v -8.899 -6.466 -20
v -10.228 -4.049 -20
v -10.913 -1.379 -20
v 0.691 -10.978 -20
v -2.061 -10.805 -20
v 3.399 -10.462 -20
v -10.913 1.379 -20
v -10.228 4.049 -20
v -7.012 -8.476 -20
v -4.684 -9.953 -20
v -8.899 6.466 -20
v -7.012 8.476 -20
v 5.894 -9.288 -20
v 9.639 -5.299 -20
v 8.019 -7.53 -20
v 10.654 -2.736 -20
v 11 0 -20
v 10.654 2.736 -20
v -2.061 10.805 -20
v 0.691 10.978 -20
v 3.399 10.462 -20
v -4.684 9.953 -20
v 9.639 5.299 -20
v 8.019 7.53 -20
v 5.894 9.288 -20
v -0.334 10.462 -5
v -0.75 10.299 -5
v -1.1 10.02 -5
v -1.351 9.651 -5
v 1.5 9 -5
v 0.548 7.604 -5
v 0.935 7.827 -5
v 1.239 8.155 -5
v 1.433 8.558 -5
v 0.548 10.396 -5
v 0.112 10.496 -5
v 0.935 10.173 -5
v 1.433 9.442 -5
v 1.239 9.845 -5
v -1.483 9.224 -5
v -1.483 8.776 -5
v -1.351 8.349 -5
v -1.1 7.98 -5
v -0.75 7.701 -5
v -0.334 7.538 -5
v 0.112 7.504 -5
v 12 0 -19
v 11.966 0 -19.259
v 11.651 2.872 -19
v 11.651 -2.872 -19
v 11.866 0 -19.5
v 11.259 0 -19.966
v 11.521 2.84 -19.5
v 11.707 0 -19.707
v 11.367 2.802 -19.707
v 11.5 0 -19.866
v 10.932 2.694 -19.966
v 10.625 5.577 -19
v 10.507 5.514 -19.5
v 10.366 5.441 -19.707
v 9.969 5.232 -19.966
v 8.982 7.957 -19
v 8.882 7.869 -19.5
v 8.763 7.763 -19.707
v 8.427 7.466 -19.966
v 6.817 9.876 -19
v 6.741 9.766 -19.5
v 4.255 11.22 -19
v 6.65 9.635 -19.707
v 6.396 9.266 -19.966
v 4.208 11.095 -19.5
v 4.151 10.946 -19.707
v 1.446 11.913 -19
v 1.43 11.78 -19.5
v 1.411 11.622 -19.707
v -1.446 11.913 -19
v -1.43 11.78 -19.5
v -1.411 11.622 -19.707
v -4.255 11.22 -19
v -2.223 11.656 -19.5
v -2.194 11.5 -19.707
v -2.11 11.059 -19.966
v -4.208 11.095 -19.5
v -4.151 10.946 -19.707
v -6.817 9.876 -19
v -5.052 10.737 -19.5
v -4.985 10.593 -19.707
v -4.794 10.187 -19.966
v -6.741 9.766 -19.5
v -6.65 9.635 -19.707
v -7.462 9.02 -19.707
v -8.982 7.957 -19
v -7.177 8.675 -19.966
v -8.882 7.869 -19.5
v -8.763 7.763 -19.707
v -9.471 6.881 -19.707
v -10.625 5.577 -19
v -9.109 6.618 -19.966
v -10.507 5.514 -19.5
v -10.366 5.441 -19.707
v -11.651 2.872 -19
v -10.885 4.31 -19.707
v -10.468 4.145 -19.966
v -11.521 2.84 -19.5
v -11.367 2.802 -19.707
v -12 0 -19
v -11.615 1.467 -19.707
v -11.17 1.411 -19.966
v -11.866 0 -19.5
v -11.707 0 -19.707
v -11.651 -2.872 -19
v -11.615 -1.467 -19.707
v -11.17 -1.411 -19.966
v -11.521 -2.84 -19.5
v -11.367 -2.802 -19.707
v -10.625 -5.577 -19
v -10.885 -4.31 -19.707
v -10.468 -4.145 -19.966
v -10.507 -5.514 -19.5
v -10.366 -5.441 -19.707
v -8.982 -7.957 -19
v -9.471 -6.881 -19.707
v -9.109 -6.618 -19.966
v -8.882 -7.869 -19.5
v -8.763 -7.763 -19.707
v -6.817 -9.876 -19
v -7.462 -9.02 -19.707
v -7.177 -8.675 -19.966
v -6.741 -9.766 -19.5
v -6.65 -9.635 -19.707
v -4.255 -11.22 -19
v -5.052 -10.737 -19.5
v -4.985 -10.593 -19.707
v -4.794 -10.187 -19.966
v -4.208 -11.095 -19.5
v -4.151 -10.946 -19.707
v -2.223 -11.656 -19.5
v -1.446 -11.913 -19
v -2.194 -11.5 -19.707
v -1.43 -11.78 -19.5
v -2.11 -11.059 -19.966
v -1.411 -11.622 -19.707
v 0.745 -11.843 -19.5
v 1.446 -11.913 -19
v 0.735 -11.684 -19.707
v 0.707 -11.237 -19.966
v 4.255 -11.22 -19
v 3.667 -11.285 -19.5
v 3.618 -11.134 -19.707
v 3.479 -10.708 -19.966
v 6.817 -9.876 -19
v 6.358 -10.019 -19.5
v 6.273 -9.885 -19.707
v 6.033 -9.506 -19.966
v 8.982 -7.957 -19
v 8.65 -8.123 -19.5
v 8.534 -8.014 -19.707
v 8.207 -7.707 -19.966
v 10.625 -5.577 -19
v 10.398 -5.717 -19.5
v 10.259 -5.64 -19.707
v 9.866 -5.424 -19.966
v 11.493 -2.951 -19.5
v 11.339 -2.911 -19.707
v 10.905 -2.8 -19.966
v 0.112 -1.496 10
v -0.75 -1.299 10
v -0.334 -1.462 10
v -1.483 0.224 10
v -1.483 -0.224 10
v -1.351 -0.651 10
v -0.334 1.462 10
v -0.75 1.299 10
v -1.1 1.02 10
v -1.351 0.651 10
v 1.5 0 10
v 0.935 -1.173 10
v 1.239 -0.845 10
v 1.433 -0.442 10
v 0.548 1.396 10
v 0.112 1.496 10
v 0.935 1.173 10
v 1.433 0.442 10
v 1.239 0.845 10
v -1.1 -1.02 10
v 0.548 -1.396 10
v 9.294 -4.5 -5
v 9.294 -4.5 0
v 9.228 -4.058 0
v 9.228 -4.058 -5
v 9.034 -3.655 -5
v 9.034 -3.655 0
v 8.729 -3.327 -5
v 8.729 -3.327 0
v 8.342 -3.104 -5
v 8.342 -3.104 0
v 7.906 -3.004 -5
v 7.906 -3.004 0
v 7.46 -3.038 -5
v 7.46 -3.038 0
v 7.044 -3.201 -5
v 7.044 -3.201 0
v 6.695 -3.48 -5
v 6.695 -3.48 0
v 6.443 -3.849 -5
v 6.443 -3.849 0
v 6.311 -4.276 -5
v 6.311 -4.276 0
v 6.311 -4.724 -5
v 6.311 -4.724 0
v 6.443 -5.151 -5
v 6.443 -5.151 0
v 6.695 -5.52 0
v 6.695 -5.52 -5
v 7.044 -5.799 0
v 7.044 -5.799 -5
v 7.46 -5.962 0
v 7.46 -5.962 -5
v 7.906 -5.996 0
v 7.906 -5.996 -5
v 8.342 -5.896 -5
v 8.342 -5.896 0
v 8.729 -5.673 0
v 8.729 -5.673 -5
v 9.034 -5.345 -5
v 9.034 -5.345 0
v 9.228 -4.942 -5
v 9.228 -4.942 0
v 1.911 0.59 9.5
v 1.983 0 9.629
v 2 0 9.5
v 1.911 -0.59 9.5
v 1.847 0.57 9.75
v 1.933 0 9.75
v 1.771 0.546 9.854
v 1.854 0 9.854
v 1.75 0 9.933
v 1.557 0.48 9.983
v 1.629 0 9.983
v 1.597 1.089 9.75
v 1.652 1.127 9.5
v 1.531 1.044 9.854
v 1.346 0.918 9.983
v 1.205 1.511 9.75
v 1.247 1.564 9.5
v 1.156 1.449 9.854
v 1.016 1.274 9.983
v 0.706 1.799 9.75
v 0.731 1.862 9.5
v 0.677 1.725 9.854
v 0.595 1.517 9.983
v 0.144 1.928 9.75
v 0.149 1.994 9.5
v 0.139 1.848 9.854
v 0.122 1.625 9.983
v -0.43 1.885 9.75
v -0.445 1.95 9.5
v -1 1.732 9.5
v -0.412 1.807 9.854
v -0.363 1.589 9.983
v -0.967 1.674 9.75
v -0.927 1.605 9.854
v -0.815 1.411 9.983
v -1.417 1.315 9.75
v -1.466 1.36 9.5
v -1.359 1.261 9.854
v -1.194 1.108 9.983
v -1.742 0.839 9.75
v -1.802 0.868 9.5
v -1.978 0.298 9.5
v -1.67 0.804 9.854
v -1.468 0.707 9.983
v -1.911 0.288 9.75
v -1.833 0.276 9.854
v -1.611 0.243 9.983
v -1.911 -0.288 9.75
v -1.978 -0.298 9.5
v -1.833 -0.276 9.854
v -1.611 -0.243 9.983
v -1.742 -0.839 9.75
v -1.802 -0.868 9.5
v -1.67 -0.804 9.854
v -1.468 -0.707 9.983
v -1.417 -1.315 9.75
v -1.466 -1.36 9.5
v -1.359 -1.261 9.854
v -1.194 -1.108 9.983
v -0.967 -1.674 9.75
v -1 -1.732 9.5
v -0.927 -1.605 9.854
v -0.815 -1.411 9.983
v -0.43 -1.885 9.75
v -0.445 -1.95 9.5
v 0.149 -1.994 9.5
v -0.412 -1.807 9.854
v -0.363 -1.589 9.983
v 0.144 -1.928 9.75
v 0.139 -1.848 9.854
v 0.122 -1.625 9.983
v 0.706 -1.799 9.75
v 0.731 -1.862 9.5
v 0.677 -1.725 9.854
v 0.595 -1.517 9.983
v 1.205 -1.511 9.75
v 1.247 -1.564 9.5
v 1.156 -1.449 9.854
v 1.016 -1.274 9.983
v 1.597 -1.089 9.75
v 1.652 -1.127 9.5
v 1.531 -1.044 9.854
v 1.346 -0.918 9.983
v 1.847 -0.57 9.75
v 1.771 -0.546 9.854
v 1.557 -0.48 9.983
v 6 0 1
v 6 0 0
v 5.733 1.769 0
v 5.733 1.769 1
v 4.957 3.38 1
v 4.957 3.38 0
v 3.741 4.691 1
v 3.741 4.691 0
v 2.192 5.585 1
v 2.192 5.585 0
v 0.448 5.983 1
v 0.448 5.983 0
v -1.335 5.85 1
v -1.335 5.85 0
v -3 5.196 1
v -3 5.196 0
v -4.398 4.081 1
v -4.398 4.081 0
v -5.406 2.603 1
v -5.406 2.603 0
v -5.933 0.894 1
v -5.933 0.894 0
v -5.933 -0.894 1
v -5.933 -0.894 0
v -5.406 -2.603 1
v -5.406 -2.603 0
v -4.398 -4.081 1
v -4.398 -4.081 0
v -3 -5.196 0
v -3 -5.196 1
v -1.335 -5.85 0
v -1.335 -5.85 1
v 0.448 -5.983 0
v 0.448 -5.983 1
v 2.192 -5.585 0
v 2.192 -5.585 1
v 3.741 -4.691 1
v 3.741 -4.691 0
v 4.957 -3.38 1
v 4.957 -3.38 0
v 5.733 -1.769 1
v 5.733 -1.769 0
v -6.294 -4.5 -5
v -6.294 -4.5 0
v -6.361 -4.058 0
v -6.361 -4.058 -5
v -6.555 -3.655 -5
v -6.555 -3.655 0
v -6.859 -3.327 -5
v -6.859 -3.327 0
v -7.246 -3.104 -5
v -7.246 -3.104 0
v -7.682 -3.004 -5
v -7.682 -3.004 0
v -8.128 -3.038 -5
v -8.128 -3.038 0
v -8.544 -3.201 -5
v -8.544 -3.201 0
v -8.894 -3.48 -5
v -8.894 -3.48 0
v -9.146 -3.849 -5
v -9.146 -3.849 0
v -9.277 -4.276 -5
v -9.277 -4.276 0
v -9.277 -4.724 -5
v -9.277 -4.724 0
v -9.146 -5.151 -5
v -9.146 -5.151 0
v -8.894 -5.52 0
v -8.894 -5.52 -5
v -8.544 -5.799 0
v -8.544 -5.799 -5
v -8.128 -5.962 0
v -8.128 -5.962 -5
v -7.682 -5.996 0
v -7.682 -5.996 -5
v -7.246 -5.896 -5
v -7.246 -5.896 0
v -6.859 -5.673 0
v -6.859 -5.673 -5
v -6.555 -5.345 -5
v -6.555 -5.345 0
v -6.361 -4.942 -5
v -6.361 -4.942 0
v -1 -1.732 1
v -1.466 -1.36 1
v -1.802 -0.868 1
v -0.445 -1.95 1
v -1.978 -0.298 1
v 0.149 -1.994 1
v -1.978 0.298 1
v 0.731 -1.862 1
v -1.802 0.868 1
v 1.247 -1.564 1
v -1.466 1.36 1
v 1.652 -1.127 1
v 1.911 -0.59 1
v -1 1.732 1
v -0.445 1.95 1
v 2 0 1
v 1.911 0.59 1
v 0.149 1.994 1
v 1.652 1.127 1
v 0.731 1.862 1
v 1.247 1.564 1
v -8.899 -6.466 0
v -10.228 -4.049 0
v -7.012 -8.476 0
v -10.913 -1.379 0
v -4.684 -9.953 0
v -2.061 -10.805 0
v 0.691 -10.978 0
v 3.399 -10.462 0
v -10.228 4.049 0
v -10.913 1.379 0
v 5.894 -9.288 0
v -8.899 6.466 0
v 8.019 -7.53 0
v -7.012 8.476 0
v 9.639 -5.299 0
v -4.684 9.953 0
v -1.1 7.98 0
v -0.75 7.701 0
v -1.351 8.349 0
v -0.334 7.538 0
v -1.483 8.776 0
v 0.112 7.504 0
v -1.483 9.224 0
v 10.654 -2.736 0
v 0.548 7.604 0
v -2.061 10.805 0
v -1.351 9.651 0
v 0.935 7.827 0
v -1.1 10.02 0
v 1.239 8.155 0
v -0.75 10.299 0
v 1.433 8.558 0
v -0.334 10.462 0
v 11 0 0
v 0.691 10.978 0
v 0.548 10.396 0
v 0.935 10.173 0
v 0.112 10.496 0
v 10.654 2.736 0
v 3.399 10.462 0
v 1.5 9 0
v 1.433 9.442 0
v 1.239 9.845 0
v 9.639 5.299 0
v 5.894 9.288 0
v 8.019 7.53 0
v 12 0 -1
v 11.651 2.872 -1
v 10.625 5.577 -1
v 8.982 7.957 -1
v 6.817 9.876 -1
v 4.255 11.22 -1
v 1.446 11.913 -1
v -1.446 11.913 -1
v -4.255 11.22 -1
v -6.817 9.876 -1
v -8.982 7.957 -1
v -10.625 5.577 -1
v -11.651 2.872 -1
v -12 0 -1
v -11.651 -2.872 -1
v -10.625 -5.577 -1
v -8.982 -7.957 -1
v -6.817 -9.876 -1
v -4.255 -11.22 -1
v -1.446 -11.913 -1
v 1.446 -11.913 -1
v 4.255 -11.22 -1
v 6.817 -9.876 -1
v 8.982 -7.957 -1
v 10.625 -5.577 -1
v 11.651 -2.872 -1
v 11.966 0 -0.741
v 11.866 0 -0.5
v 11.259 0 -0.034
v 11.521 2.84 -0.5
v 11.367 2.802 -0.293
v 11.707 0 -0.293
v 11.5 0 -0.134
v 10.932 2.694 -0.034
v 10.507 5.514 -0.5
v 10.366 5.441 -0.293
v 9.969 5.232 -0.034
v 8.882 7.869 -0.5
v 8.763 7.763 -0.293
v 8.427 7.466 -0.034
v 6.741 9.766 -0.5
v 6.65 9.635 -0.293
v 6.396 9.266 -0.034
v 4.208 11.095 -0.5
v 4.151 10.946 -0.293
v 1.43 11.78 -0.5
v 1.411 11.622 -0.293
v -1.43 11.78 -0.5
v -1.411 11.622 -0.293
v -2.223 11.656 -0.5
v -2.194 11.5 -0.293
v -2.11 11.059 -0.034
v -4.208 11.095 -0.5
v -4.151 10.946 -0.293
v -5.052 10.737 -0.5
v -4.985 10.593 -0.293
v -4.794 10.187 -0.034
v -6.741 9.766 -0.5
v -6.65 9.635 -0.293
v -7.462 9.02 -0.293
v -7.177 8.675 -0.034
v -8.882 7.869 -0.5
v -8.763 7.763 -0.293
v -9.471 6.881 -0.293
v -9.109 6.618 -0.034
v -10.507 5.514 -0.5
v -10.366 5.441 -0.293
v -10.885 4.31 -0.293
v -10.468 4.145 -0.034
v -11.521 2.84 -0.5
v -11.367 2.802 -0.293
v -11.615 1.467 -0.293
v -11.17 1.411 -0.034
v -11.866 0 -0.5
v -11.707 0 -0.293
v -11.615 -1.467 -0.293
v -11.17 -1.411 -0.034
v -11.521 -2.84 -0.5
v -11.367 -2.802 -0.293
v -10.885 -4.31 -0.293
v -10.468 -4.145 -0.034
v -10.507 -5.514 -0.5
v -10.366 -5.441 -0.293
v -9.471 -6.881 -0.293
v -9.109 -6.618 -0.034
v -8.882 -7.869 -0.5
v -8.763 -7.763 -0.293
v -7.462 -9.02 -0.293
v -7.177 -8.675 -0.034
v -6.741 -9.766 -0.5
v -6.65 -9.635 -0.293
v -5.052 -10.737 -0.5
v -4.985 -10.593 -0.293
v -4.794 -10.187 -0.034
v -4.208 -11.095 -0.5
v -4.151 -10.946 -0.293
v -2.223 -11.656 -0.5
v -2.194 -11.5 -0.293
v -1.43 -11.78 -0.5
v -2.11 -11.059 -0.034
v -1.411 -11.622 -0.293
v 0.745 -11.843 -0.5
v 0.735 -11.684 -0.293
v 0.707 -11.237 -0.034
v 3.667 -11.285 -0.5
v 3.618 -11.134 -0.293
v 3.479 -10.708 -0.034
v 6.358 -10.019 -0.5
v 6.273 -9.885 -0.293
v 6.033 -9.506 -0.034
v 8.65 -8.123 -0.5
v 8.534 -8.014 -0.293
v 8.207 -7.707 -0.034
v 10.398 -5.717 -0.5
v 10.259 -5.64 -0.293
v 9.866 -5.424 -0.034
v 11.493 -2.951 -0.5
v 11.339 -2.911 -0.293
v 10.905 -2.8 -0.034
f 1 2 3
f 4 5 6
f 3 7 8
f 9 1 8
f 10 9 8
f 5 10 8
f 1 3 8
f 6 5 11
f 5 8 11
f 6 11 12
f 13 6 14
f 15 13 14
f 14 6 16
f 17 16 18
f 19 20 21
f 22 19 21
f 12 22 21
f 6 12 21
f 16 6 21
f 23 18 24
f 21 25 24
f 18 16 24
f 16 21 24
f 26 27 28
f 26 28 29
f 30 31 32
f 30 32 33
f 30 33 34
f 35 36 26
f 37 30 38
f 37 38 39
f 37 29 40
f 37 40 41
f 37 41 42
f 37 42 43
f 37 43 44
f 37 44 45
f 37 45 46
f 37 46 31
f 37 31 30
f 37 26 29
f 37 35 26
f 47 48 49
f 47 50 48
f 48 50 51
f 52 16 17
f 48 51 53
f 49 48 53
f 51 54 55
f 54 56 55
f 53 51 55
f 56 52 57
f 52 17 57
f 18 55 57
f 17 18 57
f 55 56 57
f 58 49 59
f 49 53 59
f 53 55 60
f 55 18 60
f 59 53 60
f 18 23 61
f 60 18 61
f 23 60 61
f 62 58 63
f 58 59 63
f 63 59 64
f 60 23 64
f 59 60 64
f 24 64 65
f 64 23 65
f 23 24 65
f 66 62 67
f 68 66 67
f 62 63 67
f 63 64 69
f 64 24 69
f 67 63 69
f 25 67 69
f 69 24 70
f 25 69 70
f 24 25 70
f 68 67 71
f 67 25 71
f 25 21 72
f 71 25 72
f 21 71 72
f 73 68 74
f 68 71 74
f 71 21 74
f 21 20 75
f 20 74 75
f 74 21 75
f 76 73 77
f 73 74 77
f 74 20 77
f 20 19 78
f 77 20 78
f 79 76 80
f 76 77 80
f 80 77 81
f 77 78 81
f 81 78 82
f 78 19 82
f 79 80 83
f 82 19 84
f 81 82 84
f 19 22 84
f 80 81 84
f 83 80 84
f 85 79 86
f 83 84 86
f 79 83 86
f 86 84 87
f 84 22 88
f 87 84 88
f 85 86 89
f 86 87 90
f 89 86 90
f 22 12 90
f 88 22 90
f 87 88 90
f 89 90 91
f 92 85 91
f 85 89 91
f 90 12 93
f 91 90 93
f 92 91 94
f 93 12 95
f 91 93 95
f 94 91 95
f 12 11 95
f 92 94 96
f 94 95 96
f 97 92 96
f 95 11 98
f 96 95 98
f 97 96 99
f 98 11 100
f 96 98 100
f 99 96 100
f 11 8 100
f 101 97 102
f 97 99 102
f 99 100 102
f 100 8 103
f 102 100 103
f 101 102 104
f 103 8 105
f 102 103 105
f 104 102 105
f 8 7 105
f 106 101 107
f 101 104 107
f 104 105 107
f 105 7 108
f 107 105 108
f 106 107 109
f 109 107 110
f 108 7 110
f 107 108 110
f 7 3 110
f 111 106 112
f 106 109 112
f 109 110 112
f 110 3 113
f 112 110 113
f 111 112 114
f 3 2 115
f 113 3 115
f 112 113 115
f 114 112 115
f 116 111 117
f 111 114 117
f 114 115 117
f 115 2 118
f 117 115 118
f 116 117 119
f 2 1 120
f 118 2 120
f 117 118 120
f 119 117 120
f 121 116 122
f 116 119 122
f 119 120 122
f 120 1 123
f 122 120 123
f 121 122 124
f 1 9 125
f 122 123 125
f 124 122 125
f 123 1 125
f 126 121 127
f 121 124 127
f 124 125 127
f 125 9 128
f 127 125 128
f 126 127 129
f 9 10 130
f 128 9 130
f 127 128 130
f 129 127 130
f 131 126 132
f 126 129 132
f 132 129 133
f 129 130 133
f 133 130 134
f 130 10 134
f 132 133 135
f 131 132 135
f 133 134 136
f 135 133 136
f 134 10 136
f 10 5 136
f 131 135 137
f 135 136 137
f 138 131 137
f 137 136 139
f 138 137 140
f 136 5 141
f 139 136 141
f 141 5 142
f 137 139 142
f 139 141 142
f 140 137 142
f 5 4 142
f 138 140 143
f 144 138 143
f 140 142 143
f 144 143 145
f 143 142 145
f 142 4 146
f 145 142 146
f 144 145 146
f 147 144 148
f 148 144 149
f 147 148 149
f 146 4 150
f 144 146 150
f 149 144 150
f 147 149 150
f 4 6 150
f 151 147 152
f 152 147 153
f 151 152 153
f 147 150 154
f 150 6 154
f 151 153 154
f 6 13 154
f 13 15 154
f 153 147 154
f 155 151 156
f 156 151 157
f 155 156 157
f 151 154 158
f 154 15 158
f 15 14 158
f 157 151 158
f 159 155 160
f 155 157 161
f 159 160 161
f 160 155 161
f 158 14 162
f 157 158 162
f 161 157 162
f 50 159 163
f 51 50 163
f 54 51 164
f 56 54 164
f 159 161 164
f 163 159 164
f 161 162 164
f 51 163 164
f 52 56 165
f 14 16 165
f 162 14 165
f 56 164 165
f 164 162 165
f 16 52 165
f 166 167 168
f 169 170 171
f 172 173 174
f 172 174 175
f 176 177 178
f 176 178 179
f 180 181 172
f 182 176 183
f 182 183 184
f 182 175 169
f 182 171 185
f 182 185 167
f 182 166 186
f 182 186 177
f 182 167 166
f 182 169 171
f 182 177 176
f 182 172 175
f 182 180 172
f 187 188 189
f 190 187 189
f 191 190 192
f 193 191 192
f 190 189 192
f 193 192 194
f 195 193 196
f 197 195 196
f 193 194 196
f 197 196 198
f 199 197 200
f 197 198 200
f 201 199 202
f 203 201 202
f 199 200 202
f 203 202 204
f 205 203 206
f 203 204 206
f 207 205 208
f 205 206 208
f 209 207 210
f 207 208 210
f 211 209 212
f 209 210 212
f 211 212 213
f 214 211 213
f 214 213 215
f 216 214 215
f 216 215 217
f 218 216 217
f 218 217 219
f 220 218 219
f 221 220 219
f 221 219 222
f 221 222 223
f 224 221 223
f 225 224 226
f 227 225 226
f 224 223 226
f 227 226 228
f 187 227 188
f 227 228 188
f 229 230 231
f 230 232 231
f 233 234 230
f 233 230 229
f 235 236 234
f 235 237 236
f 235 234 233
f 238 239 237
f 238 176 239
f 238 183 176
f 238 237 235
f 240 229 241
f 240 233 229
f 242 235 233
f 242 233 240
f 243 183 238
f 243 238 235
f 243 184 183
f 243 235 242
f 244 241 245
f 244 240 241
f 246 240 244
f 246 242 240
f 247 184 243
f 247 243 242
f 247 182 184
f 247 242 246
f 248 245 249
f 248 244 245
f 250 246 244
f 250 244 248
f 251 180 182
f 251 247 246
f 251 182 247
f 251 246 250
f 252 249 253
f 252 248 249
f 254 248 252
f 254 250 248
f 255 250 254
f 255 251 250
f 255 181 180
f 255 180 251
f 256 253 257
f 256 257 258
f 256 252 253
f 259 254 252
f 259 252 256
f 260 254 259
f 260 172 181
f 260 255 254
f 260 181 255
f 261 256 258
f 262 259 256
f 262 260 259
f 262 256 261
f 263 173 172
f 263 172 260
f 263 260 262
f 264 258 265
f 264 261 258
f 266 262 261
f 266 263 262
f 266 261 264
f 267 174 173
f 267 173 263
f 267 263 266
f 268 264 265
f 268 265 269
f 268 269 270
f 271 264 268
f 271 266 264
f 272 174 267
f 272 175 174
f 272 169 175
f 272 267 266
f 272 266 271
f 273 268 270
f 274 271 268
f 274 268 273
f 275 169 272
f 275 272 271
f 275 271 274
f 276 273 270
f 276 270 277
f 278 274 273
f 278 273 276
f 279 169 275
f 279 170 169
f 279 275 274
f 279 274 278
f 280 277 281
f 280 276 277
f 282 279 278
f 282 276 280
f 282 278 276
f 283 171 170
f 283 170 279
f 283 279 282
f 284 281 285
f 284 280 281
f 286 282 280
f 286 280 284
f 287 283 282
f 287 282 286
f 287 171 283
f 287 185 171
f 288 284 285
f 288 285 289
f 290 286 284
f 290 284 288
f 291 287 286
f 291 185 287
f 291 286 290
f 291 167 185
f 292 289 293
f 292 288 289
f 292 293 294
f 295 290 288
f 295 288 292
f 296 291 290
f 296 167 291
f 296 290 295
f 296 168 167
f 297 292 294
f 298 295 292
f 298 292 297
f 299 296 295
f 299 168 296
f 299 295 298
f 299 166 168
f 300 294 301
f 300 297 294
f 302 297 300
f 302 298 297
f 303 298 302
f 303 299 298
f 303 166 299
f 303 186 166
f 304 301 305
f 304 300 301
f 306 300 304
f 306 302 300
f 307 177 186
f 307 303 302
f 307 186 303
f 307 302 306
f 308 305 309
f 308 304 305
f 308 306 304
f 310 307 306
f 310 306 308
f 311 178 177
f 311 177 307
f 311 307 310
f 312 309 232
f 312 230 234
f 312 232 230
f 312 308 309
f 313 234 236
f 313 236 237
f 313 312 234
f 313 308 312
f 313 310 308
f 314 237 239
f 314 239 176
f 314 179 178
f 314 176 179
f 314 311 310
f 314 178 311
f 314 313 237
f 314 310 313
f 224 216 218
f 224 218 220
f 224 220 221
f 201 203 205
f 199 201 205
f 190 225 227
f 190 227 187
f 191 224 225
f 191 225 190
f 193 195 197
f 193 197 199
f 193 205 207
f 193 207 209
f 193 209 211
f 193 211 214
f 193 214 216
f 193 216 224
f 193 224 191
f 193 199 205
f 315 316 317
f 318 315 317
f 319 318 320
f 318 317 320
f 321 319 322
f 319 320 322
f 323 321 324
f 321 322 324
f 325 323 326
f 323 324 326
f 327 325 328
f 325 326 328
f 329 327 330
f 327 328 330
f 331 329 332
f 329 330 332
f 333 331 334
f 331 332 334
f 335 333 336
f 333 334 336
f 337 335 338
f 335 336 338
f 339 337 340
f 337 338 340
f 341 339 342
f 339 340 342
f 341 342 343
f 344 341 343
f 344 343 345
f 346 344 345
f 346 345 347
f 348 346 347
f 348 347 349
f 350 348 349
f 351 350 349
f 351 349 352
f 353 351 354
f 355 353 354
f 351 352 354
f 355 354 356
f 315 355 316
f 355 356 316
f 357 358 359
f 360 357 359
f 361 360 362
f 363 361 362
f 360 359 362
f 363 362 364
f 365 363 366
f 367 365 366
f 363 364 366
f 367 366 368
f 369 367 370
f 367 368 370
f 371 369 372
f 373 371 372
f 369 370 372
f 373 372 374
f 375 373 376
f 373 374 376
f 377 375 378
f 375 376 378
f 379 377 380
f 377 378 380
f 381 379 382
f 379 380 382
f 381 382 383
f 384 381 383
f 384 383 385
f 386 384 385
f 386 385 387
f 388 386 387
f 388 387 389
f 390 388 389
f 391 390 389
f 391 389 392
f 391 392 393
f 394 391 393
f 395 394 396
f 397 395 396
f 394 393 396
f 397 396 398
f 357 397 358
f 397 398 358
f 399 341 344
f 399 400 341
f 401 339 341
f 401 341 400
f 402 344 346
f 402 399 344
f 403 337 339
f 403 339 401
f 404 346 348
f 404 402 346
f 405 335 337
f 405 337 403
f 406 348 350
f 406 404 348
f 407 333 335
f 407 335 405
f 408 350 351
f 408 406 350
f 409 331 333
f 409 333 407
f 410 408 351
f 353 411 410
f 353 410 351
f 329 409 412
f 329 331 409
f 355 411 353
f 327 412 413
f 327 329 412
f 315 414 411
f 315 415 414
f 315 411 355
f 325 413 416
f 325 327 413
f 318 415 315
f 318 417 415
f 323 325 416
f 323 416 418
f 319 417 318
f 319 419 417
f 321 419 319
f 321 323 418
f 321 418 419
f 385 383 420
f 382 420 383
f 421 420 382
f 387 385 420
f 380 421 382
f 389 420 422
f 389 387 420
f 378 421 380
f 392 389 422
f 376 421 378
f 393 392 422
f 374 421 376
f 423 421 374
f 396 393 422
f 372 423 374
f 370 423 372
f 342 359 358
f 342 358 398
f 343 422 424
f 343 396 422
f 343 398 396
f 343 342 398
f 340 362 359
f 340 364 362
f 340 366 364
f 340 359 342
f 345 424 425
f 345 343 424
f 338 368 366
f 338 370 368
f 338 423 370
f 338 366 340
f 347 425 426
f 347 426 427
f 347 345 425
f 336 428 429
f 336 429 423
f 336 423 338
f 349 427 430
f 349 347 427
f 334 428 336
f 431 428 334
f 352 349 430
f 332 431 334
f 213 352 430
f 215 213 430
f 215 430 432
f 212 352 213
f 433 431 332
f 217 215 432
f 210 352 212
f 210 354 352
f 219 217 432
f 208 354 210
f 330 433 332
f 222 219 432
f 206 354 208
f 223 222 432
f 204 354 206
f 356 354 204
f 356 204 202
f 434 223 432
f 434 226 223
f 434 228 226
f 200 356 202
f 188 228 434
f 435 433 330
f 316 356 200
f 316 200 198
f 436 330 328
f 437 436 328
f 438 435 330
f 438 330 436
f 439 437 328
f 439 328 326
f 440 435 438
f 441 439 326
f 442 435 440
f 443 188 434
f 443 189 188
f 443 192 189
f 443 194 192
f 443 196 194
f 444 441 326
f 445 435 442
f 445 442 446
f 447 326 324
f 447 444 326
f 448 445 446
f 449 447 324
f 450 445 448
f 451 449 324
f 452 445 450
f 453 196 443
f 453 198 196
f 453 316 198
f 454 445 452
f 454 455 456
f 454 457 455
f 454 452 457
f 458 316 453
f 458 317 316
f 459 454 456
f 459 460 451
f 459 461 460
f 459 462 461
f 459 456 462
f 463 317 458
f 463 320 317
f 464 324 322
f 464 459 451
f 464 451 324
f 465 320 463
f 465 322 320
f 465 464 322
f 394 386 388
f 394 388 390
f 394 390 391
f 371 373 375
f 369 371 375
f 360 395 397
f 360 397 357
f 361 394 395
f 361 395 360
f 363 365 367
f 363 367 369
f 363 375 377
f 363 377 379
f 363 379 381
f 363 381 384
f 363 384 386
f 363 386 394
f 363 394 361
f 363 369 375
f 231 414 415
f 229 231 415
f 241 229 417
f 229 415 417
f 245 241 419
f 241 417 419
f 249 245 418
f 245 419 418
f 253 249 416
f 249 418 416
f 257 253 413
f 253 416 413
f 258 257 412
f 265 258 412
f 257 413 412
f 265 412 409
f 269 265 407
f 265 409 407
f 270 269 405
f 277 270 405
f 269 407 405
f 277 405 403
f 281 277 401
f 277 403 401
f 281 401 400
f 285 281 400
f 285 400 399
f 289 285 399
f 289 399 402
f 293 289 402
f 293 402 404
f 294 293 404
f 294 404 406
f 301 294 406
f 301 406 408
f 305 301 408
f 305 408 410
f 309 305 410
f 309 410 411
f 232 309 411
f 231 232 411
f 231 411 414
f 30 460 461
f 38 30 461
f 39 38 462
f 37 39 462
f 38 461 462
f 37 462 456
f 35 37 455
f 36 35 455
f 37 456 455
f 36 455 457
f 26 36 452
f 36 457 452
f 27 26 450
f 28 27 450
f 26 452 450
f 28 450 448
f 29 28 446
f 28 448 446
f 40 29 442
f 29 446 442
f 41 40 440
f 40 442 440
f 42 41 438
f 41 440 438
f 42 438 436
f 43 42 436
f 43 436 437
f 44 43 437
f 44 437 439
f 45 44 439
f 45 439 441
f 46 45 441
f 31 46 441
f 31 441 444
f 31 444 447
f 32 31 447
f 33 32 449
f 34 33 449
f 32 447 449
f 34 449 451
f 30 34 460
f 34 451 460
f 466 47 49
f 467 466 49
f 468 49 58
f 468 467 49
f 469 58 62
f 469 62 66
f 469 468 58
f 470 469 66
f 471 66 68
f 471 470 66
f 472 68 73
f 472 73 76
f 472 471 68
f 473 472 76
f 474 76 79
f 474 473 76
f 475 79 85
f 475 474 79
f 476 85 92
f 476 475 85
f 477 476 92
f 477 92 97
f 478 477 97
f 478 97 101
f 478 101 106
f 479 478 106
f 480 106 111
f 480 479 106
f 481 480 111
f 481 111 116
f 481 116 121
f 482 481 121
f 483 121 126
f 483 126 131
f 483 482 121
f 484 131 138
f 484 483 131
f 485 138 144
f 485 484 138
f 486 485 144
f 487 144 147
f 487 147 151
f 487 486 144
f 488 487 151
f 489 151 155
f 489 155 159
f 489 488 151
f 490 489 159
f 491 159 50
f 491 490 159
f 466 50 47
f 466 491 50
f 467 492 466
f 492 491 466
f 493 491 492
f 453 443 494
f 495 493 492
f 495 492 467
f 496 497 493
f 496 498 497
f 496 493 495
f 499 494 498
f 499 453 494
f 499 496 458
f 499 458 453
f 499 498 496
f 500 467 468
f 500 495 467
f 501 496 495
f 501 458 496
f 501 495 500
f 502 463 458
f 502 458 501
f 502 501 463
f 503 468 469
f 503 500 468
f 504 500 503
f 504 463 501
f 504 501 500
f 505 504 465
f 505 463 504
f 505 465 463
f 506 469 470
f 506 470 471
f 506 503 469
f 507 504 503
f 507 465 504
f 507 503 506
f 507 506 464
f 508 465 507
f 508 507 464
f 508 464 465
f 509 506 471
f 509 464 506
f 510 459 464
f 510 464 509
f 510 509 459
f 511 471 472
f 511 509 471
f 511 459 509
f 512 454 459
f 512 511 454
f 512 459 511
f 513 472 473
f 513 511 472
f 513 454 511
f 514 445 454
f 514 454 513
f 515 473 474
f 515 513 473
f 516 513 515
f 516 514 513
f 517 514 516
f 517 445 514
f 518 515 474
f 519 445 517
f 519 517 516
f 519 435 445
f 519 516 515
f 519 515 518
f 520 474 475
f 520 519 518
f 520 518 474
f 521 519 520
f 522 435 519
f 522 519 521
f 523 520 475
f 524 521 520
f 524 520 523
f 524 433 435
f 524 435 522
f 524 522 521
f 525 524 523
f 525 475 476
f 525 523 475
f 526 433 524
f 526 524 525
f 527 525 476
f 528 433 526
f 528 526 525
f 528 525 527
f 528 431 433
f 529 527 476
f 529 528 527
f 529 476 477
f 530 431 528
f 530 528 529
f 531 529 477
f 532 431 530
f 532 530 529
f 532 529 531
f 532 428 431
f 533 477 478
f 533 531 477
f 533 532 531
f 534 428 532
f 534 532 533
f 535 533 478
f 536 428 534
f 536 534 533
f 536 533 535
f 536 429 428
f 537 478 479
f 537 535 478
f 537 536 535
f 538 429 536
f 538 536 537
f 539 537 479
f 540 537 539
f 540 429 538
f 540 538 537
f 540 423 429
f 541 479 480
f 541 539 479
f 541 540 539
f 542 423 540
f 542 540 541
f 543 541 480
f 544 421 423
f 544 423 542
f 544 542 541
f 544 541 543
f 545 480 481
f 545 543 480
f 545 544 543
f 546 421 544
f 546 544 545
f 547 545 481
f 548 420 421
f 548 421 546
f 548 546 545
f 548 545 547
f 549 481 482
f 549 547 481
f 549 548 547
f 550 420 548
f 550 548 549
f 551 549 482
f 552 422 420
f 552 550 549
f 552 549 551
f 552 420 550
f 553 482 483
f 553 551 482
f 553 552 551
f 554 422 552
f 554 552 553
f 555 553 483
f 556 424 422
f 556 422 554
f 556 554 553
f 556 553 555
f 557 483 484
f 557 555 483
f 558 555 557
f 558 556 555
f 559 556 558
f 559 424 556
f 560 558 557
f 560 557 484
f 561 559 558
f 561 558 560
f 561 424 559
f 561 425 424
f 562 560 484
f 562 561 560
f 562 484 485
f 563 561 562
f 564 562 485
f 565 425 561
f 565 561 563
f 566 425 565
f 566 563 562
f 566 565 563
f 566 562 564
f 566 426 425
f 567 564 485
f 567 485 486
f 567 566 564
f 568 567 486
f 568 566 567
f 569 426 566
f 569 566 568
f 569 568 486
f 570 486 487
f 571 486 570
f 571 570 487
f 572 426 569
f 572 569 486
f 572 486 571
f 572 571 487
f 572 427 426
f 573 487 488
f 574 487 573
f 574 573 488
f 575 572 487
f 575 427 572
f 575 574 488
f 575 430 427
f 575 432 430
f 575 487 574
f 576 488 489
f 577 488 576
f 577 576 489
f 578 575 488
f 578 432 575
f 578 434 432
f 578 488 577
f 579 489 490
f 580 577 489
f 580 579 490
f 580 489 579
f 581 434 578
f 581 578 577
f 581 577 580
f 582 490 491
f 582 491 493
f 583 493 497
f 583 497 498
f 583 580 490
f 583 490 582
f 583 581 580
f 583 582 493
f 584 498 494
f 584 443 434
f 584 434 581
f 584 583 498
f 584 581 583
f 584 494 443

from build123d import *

# Parameters (mm, degrees)
ESQUISSE1_R             = 12
EXTRUSION1_DEPTH        = 20
ESQUISSE2_R             = 2
EXTRUSION2_DEPTH        = 10
CONG_1_R                = 1
CONG_2_R                = 1
CONG_3_R                = 0.5
ESQUISSE4_R             = 6
EXTRUSION3_DEPTH        = 1
ESQUISSE5_R             = 1.5
ENL_V_MAT_EXTRU_1_DEPTH = 5


with BuildPart() as part:
    # Esquisse1 → Extrusion1 (new body)
    with BuildSketch(Plane.XY):
        Circle(ESQUISSE1_R)
    extrude(amount=-EXTRUSION1_DEPTH)

    # Esquisse2 → Extrusion2 (add)
    with BuildSketch(Plane.XY):
        Circle(ESQUISSE2_R)
    extrude(amount=EXTRUSION2_DEPTH)

    # Congé1
    cong_1_edges = [part.edges().sort_by_distance(p)[0] for p in [
        (-12, 0, 0),
    ]]
    fillet(cong_1_edges, radius=CONG_1_R)

    # Congé2
    cong_2_edges = [part.edges().sort_by_distance(p)[0] for p in [
        (-12, 0, -20),
    ]]
    fillet(cong_2_edges, radius=CONG_2_R)

    # Congé3
    cong_3_edges = [part.edges().sort_by_distance(p)[0] for p in [
        (-2, 0, 10),
    ]]
    fillet(cong_3_edges, radius=CONG_3_R)

    # Esquisse4 → Extrusion3 (add)
    with BuildSketch(Plane.XY):
        Circle(ESQUISSE4_R)
    extrude(amount=EXTRUSION3_DEPTH)

    # Esquisse5 → Enlèv. mat.-Extru.1 (cut)
    with BuildSketch(Plane.XY):
        with Locations((0, 9)):
            Circle(ESQUISSE5_R)
        with Locations((-7.794228634, -4.5)):
            Circle(ESQUISSE5_R)
        with Locations((7.794228634, -4.5)):
            Circle(ESQUISSE5_R)
    extrude(amount=-ENL_V_MAT_EXTRU_1_DEPTH, mode=Mode.SUBTRACT)


solid = part.part
